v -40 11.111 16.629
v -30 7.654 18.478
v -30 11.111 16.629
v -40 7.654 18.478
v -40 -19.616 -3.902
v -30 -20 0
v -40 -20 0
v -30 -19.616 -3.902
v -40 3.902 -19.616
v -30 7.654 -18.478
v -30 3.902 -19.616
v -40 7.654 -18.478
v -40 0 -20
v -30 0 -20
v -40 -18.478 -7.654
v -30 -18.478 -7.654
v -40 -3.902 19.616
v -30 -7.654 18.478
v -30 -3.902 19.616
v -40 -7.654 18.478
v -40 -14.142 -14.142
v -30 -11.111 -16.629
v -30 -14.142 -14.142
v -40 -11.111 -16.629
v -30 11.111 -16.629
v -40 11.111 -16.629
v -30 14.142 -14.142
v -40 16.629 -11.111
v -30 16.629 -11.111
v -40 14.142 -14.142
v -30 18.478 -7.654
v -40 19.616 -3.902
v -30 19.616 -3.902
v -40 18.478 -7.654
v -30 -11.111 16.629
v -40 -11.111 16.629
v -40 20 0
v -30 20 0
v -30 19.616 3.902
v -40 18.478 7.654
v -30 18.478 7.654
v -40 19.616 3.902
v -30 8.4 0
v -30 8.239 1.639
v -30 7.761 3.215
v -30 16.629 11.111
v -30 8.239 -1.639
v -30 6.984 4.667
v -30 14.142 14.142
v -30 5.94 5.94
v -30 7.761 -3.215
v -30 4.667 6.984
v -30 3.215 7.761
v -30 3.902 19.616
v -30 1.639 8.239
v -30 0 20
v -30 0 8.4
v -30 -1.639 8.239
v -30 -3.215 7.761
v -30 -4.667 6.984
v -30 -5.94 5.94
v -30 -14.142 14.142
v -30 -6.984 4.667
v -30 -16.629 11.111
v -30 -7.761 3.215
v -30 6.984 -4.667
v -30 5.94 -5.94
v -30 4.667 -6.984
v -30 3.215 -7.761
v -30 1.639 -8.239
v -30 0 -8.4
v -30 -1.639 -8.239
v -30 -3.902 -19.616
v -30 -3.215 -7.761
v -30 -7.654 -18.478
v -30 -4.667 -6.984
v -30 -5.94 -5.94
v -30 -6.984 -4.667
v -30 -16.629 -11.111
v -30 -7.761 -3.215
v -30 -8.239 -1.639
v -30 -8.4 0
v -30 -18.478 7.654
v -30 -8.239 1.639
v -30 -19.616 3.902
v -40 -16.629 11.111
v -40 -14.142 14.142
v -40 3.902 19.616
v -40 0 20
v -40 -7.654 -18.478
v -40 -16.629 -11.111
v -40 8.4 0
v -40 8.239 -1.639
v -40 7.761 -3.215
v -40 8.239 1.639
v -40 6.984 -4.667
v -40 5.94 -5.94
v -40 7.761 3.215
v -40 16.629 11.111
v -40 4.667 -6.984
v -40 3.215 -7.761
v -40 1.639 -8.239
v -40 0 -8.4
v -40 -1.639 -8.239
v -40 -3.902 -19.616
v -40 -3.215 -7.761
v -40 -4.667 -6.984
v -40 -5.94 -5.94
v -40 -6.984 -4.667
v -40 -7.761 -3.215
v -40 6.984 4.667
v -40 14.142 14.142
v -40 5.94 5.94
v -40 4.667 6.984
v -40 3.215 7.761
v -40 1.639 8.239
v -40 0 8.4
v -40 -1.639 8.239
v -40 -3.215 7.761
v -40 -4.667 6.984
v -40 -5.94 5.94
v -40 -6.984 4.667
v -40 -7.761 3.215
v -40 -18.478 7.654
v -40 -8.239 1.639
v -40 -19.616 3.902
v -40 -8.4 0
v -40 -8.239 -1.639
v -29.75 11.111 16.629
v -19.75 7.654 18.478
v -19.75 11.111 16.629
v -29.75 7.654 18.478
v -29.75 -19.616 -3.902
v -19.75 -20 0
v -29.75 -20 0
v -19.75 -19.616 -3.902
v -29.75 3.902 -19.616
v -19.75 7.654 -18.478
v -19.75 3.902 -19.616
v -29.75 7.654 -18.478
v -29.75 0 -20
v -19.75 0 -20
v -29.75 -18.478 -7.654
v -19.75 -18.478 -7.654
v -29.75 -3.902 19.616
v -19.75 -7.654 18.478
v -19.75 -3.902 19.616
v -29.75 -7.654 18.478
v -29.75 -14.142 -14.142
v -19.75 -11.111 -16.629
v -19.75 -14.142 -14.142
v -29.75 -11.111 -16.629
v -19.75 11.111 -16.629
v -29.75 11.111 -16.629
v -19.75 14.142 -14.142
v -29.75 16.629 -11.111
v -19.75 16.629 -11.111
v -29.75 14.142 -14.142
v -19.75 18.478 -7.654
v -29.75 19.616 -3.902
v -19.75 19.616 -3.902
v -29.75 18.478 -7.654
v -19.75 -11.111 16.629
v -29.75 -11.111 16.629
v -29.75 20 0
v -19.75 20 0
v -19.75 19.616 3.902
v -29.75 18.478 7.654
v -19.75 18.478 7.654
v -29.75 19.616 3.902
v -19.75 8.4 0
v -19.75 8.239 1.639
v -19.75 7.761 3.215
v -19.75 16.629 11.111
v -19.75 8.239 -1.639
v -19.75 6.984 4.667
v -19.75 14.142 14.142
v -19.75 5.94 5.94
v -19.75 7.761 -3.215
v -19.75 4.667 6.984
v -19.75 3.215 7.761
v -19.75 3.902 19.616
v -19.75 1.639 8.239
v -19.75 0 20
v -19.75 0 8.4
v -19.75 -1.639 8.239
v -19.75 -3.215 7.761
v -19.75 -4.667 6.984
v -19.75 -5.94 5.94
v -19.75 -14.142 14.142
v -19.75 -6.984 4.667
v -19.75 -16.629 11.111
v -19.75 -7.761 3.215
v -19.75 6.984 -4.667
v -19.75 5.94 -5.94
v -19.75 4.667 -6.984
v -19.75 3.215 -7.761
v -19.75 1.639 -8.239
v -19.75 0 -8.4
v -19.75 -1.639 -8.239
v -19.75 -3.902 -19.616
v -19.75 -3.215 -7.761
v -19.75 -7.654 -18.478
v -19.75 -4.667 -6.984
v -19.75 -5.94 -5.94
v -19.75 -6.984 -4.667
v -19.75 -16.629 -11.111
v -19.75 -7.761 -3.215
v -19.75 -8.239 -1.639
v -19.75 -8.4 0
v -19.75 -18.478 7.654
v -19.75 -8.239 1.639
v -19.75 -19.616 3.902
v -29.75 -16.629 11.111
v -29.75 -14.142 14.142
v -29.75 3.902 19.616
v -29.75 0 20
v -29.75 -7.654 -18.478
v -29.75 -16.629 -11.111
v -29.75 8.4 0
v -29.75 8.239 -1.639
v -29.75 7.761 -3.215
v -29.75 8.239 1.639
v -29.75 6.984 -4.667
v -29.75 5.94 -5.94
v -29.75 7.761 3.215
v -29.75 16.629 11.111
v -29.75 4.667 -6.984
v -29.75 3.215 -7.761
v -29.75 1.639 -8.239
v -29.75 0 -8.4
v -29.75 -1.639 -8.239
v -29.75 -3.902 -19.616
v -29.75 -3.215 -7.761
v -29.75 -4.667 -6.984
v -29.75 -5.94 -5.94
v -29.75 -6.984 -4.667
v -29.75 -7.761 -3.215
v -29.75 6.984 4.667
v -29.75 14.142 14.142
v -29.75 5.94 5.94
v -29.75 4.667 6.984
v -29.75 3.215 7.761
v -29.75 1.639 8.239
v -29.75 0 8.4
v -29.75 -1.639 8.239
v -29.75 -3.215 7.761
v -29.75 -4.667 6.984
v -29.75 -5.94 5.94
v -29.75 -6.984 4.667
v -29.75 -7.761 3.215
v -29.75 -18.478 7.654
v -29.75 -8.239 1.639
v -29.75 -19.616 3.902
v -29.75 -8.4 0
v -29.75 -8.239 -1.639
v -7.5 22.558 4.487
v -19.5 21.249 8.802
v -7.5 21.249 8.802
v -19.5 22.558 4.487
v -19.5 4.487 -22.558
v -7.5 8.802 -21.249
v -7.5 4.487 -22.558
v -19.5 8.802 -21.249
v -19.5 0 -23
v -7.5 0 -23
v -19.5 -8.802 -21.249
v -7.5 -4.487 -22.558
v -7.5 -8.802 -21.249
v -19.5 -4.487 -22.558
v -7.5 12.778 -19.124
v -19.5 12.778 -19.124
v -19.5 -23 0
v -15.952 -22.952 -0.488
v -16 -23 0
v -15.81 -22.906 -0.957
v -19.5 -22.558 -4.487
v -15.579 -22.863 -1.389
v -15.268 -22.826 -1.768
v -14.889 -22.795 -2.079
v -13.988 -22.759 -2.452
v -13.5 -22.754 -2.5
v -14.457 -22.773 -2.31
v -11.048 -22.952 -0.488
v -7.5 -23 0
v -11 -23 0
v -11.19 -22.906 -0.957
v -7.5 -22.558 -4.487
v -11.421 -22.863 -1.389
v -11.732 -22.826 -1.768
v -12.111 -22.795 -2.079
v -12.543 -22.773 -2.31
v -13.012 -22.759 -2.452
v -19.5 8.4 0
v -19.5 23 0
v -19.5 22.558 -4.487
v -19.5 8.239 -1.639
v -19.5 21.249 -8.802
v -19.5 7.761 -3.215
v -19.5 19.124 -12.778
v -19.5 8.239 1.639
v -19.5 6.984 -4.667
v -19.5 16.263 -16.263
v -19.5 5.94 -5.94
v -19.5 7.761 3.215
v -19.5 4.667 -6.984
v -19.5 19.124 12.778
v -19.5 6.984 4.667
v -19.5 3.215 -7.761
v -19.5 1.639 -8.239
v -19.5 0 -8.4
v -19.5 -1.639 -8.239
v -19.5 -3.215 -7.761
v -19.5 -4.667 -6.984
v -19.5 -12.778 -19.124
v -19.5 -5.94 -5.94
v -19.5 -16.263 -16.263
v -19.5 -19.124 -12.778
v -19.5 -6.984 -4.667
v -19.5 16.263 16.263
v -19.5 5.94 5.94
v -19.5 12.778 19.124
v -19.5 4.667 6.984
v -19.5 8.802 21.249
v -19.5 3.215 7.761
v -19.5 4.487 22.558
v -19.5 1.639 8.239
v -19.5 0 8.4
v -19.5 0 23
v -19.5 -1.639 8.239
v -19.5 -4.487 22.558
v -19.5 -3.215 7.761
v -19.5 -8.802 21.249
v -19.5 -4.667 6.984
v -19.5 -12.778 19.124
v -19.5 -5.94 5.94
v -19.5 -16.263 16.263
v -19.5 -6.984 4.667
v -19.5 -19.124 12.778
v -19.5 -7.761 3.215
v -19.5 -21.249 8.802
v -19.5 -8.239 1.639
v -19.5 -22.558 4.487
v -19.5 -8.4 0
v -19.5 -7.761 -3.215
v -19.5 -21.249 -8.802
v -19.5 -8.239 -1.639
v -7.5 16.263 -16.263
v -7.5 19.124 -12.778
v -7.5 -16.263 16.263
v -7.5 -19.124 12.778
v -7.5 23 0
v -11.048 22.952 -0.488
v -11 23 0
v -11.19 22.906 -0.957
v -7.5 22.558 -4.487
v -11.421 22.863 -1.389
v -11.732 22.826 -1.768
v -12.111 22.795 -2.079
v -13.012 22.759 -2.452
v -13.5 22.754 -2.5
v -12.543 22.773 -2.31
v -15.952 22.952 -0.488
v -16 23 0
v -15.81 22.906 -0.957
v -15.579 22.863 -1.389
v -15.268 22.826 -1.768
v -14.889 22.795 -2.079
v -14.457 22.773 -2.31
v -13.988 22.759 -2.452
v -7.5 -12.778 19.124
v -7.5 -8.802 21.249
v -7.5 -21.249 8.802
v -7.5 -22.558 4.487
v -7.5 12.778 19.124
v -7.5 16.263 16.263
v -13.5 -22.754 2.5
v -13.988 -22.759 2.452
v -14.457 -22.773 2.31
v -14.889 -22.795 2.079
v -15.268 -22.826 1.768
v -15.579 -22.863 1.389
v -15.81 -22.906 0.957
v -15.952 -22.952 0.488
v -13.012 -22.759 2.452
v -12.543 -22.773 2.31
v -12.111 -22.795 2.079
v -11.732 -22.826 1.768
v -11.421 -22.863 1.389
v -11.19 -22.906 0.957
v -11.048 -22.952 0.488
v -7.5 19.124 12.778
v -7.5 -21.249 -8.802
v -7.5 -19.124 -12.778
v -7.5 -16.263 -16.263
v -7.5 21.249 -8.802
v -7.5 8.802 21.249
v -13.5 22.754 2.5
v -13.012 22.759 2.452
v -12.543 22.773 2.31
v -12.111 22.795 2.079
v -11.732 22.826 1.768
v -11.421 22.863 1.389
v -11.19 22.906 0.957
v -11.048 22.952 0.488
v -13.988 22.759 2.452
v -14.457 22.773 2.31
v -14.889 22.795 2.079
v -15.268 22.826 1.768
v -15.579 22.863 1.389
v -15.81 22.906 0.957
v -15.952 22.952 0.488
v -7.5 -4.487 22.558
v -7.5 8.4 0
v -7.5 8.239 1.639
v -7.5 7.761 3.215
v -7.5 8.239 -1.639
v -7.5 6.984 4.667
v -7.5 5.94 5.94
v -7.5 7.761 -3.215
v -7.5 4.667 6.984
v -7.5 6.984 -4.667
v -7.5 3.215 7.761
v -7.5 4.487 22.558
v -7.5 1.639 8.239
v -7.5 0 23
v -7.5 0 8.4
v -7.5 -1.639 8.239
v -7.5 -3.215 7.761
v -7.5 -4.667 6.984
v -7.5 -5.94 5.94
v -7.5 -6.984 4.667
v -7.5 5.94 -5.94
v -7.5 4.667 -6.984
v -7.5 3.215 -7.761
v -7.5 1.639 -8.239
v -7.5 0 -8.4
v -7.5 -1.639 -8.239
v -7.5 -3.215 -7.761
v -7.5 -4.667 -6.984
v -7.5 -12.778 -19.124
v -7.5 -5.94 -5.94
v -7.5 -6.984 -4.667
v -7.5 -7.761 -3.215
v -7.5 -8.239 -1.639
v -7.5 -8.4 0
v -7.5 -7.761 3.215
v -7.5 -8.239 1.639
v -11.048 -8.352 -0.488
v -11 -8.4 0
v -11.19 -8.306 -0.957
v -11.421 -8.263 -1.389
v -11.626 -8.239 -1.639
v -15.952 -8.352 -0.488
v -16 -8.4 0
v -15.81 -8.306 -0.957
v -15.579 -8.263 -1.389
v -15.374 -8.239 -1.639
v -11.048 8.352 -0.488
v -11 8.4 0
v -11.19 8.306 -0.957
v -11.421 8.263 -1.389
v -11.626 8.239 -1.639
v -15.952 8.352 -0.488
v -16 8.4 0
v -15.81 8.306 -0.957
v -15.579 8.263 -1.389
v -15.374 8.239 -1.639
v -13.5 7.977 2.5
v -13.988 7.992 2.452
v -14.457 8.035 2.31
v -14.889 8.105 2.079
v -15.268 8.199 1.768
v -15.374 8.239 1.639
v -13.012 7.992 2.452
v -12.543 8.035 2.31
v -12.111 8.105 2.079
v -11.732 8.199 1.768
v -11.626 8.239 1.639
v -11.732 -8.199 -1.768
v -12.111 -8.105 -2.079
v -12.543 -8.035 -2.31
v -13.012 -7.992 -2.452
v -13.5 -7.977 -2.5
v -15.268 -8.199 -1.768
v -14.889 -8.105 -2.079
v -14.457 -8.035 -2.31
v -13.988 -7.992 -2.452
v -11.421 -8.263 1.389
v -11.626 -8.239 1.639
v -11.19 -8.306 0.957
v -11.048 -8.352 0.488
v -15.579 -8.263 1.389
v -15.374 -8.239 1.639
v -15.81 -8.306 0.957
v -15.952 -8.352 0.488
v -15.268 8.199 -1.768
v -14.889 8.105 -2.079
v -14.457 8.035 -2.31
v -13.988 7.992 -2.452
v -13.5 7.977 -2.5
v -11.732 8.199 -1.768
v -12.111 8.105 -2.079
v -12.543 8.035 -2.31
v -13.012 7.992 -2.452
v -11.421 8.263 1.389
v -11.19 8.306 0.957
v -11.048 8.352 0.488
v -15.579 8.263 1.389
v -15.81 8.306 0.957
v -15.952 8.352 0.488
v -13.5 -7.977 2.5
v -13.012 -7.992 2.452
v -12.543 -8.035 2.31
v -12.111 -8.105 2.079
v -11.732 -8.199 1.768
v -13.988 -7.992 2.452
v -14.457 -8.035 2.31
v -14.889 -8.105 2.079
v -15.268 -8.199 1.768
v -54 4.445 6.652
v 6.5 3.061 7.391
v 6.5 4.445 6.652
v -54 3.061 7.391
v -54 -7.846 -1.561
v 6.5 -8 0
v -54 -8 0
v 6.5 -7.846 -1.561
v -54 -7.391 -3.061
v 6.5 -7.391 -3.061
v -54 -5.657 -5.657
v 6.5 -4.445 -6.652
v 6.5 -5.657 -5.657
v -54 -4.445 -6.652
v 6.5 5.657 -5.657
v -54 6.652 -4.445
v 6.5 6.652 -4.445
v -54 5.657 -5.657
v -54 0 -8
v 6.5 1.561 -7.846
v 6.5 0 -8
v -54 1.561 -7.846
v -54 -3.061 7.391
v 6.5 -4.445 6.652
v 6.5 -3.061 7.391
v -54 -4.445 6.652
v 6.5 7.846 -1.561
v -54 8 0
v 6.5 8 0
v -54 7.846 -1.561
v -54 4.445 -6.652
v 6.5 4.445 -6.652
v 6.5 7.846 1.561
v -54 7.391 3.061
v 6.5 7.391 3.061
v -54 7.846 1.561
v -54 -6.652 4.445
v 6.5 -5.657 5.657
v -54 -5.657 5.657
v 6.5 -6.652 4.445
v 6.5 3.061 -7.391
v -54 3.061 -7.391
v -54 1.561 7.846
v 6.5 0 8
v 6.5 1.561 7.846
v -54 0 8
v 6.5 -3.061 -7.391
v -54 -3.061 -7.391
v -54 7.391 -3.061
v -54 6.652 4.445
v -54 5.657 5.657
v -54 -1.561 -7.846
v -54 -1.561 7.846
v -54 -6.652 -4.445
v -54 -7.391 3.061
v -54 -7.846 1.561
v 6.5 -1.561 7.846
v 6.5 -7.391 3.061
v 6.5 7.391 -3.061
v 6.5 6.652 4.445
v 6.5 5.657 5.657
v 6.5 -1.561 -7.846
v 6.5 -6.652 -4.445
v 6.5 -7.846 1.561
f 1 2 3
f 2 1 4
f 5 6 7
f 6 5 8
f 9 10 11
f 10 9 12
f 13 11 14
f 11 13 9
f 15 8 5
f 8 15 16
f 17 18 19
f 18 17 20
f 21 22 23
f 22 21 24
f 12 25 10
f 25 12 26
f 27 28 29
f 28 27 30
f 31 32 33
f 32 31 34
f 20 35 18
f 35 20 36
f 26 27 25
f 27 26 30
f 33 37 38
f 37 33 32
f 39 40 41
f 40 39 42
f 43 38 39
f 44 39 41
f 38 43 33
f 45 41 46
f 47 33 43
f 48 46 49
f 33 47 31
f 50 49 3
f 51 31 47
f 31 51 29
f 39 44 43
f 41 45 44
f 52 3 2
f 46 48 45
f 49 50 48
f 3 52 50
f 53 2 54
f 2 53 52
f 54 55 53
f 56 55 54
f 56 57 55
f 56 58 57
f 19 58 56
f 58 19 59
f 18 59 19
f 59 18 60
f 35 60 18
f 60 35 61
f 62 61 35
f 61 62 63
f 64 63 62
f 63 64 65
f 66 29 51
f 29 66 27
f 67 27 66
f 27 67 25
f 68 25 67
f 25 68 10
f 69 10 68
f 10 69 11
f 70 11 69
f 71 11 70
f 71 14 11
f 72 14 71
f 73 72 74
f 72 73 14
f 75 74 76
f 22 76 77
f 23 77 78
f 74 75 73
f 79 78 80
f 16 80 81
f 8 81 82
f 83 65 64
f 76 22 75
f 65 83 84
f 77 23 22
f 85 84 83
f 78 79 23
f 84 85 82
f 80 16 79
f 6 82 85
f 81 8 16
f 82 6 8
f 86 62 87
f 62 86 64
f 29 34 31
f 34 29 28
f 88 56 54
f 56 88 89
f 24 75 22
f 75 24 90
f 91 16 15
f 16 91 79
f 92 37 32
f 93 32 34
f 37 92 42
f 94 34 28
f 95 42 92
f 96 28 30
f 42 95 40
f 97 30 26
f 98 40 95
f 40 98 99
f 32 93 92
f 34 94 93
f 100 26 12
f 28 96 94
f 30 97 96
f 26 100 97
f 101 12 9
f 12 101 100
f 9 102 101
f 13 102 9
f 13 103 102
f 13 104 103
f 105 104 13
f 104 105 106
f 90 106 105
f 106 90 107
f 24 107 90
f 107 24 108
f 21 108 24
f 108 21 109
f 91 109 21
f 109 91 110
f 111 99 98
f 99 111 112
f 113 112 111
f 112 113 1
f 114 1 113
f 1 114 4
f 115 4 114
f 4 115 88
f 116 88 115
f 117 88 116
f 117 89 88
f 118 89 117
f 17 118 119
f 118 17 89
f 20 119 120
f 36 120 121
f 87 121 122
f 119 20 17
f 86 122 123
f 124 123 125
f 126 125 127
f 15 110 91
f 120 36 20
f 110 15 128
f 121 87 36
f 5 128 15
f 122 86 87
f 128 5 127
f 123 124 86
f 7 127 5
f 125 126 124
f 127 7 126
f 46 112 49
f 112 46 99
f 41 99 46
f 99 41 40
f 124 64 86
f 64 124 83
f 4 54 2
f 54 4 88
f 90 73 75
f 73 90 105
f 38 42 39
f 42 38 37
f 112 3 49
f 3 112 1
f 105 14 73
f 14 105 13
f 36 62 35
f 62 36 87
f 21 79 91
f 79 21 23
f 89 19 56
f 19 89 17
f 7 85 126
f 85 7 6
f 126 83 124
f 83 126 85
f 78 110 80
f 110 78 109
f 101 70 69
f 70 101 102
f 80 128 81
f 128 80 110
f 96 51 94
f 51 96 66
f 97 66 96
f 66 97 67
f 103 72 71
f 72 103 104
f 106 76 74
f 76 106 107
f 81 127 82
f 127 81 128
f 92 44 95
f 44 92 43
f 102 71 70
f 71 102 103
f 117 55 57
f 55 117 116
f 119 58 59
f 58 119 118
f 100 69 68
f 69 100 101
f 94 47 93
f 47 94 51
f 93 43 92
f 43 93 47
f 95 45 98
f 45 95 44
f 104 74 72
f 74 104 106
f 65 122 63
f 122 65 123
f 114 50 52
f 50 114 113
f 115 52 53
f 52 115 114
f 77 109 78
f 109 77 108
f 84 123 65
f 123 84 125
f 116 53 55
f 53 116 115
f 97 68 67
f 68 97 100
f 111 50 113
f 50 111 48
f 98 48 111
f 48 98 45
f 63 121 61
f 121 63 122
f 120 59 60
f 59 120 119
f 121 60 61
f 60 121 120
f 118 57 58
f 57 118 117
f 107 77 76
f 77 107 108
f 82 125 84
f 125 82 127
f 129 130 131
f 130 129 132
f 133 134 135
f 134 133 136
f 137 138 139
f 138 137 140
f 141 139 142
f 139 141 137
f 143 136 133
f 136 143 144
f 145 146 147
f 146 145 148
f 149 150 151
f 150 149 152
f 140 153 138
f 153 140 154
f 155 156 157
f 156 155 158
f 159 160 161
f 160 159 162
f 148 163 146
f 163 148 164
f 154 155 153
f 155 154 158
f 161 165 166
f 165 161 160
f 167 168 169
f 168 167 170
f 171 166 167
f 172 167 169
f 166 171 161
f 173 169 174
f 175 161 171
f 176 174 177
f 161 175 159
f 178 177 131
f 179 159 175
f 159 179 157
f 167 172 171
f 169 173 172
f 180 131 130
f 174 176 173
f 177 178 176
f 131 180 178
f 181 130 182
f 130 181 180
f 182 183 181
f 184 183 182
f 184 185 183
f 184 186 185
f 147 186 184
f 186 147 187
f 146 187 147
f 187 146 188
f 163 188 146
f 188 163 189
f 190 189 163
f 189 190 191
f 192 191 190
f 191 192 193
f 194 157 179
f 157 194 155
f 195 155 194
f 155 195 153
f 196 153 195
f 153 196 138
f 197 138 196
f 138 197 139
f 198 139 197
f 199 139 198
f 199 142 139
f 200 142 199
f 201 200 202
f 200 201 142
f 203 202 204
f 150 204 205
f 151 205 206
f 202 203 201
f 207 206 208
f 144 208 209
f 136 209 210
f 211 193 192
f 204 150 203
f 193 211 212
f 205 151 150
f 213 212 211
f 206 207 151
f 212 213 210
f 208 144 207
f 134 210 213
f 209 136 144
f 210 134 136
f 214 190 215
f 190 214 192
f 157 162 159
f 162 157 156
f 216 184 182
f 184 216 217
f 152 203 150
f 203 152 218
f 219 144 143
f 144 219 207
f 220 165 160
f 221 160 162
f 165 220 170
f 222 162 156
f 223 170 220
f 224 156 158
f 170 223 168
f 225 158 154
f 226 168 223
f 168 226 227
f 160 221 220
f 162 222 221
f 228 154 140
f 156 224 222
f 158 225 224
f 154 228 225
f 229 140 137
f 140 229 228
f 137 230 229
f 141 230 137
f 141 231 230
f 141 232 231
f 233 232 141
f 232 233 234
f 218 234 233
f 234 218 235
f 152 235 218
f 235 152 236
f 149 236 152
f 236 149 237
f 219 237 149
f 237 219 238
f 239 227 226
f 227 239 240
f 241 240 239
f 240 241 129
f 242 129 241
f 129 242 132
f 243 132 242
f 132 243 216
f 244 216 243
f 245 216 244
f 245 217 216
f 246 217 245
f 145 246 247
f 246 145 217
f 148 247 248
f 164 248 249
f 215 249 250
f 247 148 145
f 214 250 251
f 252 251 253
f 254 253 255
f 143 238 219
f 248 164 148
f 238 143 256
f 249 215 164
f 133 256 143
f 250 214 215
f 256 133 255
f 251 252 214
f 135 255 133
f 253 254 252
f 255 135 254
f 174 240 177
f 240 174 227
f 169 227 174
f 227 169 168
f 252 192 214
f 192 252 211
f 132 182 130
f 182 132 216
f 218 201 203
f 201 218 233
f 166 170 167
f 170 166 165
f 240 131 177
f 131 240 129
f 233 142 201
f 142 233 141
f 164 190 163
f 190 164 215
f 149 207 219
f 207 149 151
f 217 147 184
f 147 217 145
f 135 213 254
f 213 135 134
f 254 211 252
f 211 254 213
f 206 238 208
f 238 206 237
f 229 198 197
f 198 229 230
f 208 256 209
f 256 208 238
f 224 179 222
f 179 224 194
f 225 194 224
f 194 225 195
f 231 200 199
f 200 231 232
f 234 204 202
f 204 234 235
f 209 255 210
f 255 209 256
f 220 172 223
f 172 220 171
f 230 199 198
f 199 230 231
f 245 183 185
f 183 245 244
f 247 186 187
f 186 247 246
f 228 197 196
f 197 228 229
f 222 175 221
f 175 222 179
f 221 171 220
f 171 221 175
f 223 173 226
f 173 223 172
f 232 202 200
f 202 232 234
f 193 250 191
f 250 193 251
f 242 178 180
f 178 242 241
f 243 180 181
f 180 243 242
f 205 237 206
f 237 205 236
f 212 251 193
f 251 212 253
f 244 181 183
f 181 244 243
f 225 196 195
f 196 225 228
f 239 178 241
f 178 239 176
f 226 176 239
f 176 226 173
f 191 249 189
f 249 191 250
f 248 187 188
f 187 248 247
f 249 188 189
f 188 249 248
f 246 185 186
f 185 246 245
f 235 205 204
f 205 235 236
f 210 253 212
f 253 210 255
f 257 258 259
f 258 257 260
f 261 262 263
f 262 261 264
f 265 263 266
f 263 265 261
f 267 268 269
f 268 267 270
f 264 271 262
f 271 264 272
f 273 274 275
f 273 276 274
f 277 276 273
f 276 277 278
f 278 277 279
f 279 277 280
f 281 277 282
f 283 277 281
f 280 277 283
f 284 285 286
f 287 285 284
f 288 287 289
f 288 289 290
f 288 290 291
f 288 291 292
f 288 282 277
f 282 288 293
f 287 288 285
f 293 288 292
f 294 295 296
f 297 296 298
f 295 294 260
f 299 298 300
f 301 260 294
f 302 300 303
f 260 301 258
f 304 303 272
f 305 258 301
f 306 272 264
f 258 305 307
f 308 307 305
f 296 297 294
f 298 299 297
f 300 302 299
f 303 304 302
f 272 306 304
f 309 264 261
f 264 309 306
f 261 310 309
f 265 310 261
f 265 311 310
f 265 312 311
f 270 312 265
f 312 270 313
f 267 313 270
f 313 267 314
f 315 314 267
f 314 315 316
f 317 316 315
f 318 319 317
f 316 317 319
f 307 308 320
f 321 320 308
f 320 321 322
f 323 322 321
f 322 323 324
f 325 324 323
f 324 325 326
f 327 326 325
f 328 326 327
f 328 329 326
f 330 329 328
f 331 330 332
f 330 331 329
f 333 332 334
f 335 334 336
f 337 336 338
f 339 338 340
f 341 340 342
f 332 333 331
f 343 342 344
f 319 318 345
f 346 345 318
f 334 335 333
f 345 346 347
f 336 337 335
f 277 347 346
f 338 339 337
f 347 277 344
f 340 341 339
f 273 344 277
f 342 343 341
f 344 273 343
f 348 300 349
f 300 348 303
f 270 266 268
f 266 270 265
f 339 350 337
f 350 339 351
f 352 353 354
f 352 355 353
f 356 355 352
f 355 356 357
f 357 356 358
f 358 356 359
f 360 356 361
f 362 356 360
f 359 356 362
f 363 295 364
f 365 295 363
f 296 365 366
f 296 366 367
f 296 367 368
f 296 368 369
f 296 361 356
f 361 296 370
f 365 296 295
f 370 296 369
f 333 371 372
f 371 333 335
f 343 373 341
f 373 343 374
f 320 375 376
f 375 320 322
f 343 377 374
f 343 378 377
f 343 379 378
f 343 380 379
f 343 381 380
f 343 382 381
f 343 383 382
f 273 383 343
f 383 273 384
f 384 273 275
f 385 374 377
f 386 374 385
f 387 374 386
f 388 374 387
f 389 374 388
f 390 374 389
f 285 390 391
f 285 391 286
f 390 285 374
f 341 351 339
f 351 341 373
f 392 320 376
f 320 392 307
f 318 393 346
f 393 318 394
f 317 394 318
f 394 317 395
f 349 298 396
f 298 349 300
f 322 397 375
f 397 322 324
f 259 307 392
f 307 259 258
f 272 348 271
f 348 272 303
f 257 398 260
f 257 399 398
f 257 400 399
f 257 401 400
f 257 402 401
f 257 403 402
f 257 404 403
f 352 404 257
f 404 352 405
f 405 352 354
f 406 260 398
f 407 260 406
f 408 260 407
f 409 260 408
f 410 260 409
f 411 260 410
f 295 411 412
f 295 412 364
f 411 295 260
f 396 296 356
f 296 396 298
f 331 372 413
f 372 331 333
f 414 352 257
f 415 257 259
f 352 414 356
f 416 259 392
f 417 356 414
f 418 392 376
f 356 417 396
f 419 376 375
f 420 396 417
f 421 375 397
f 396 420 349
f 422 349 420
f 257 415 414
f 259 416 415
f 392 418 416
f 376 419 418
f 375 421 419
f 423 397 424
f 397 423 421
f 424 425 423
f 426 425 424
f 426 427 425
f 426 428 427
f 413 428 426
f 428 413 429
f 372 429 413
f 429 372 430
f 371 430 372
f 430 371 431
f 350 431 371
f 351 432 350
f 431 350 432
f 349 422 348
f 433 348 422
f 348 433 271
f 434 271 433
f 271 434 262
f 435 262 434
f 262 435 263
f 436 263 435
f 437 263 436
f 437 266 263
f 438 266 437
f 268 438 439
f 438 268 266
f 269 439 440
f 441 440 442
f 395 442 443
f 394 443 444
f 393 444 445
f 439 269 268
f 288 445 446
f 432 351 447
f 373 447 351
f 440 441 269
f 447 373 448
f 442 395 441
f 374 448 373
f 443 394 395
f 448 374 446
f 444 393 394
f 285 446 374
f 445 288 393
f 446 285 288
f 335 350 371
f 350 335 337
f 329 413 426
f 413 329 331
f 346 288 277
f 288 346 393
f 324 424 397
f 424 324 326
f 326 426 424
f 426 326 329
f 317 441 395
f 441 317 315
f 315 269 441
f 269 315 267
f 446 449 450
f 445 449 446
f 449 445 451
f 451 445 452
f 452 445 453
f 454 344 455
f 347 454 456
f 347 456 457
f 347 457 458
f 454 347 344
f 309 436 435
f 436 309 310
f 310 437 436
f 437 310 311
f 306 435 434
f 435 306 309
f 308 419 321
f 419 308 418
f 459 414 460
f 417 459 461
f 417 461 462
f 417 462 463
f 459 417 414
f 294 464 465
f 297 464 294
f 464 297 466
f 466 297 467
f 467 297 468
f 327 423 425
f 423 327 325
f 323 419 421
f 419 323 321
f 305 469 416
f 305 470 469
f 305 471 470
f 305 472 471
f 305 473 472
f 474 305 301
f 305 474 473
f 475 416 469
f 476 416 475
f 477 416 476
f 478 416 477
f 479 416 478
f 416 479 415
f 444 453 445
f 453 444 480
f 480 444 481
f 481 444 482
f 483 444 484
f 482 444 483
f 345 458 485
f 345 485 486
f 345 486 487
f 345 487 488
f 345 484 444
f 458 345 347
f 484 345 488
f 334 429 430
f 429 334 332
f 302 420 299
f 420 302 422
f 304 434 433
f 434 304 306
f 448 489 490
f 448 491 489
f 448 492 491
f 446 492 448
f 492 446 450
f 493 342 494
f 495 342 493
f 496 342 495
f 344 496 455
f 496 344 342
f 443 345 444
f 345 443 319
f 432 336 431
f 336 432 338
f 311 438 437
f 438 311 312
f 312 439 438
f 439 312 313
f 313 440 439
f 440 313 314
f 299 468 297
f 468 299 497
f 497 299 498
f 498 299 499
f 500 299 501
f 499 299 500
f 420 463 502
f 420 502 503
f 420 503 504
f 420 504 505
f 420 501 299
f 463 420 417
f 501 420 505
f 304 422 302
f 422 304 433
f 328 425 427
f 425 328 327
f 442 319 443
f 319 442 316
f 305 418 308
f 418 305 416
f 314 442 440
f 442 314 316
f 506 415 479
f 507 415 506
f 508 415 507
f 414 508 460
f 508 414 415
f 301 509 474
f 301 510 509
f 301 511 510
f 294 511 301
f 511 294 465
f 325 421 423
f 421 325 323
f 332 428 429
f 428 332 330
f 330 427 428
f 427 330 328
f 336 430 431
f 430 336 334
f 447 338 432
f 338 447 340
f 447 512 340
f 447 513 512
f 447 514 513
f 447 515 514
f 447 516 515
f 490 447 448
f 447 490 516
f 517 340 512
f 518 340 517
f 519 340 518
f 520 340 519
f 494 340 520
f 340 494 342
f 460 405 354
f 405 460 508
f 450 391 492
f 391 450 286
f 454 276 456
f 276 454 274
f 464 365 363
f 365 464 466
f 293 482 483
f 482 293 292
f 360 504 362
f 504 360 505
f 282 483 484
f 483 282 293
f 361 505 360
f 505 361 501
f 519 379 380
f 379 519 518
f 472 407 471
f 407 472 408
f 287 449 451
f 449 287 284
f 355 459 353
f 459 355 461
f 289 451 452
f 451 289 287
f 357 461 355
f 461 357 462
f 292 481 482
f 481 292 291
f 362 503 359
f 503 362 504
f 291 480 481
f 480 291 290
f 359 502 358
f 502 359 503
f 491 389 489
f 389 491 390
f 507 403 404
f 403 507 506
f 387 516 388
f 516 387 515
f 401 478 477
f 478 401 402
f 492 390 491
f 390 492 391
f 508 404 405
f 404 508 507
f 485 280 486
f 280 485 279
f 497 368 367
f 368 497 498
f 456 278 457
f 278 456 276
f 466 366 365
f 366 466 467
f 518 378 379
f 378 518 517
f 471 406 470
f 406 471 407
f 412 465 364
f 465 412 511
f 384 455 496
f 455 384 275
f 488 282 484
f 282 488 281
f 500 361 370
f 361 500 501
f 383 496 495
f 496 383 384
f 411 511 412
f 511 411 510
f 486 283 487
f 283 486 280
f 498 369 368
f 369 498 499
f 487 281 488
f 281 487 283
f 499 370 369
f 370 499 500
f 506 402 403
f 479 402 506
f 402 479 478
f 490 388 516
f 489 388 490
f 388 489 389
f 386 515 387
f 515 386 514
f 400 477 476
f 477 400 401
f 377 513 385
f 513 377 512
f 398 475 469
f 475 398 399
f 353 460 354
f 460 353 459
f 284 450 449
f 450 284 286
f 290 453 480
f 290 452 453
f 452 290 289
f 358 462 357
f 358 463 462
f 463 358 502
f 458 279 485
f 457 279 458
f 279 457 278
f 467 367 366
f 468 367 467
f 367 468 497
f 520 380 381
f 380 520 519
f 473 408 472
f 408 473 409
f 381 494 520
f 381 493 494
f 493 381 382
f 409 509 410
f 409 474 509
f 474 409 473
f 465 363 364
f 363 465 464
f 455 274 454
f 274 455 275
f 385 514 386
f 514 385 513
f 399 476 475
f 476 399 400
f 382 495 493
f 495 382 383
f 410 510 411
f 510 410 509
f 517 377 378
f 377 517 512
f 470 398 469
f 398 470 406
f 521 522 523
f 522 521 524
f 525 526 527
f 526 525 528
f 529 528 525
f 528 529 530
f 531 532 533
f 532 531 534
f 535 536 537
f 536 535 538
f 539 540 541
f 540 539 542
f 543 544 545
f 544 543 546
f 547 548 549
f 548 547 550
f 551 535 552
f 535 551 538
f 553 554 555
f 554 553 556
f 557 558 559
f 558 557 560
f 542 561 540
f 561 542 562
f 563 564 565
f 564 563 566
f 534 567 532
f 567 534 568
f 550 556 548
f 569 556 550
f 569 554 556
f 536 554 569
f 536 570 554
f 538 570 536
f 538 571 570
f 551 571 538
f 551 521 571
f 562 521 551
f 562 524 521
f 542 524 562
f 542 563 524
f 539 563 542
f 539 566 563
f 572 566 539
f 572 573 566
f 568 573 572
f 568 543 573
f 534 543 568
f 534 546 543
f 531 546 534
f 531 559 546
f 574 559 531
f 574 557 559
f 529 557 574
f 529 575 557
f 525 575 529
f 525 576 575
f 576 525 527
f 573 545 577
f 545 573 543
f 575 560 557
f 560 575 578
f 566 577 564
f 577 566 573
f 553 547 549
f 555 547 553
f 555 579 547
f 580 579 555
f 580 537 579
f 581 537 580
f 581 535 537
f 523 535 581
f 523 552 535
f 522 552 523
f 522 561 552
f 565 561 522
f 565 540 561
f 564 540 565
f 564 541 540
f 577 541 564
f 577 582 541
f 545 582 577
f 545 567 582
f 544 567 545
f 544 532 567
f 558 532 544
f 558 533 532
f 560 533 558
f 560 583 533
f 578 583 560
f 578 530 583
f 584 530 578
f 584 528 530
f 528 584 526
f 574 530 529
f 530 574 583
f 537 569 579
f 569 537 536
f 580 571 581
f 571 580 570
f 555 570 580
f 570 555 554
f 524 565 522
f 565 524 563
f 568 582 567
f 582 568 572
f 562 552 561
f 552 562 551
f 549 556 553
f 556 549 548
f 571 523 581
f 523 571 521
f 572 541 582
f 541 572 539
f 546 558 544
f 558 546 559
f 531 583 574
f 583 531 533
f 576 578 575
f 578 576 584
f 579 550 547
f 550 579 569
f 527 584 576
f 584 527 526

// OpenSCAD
$fn = 32;

// ------------------------------------------------------------------------
// Shaft with rings and collars: d16 shaft, 3 rings
// Every part is its own module, assembly() places them once.
// ------------------------------------------------------------------------

// --- part 1 ---
module shaft() {
  translate([0, 0, -30.25]) cylinder(h = 60.5, d = 16);
}

// --- part 2 ---
module spacer_a() {
  difference() {
      translate([0, 0, 0]) cylinder(h = 10, d = 40);
      translate([0, 0, -1]) cylinder(h = 12, d = 16.8);
    }
}

// --- part 3 ---
module spacer_b() {
  difference() {
      translate([0, 0, 0]) cylinder(h = 10, d = 40);
      translate([0, 0, -1]) cylinder(h = 12, d = 16.8);
    }
}

// --- part 4 ---
module collar_a() {
  difference() {
    cylinder(h = 12, d = 46);
    translate([0, 0, -1]) cylinder(h = 14, d = 16.8);
    translate([0, 0, 6]) rotate([90, 0, 0]) cylinder(h = 48, d = 5, center = true);
  }
}

// --- assembly ---
module assembly() {
  translate([-23.75, 0, 0]) rotate([0, 90, 0]) shaft();
  translate([-40, 0, 0]) rotate([0, 90, 0]) spacer_a();
  translate([-29.75, 0, 0]) rotate([0, 90, 0]) spacer_b();
  translate([-19.5, 0, 0]) rotate([0, 90, 0]) collar_a();
}

assembly();
